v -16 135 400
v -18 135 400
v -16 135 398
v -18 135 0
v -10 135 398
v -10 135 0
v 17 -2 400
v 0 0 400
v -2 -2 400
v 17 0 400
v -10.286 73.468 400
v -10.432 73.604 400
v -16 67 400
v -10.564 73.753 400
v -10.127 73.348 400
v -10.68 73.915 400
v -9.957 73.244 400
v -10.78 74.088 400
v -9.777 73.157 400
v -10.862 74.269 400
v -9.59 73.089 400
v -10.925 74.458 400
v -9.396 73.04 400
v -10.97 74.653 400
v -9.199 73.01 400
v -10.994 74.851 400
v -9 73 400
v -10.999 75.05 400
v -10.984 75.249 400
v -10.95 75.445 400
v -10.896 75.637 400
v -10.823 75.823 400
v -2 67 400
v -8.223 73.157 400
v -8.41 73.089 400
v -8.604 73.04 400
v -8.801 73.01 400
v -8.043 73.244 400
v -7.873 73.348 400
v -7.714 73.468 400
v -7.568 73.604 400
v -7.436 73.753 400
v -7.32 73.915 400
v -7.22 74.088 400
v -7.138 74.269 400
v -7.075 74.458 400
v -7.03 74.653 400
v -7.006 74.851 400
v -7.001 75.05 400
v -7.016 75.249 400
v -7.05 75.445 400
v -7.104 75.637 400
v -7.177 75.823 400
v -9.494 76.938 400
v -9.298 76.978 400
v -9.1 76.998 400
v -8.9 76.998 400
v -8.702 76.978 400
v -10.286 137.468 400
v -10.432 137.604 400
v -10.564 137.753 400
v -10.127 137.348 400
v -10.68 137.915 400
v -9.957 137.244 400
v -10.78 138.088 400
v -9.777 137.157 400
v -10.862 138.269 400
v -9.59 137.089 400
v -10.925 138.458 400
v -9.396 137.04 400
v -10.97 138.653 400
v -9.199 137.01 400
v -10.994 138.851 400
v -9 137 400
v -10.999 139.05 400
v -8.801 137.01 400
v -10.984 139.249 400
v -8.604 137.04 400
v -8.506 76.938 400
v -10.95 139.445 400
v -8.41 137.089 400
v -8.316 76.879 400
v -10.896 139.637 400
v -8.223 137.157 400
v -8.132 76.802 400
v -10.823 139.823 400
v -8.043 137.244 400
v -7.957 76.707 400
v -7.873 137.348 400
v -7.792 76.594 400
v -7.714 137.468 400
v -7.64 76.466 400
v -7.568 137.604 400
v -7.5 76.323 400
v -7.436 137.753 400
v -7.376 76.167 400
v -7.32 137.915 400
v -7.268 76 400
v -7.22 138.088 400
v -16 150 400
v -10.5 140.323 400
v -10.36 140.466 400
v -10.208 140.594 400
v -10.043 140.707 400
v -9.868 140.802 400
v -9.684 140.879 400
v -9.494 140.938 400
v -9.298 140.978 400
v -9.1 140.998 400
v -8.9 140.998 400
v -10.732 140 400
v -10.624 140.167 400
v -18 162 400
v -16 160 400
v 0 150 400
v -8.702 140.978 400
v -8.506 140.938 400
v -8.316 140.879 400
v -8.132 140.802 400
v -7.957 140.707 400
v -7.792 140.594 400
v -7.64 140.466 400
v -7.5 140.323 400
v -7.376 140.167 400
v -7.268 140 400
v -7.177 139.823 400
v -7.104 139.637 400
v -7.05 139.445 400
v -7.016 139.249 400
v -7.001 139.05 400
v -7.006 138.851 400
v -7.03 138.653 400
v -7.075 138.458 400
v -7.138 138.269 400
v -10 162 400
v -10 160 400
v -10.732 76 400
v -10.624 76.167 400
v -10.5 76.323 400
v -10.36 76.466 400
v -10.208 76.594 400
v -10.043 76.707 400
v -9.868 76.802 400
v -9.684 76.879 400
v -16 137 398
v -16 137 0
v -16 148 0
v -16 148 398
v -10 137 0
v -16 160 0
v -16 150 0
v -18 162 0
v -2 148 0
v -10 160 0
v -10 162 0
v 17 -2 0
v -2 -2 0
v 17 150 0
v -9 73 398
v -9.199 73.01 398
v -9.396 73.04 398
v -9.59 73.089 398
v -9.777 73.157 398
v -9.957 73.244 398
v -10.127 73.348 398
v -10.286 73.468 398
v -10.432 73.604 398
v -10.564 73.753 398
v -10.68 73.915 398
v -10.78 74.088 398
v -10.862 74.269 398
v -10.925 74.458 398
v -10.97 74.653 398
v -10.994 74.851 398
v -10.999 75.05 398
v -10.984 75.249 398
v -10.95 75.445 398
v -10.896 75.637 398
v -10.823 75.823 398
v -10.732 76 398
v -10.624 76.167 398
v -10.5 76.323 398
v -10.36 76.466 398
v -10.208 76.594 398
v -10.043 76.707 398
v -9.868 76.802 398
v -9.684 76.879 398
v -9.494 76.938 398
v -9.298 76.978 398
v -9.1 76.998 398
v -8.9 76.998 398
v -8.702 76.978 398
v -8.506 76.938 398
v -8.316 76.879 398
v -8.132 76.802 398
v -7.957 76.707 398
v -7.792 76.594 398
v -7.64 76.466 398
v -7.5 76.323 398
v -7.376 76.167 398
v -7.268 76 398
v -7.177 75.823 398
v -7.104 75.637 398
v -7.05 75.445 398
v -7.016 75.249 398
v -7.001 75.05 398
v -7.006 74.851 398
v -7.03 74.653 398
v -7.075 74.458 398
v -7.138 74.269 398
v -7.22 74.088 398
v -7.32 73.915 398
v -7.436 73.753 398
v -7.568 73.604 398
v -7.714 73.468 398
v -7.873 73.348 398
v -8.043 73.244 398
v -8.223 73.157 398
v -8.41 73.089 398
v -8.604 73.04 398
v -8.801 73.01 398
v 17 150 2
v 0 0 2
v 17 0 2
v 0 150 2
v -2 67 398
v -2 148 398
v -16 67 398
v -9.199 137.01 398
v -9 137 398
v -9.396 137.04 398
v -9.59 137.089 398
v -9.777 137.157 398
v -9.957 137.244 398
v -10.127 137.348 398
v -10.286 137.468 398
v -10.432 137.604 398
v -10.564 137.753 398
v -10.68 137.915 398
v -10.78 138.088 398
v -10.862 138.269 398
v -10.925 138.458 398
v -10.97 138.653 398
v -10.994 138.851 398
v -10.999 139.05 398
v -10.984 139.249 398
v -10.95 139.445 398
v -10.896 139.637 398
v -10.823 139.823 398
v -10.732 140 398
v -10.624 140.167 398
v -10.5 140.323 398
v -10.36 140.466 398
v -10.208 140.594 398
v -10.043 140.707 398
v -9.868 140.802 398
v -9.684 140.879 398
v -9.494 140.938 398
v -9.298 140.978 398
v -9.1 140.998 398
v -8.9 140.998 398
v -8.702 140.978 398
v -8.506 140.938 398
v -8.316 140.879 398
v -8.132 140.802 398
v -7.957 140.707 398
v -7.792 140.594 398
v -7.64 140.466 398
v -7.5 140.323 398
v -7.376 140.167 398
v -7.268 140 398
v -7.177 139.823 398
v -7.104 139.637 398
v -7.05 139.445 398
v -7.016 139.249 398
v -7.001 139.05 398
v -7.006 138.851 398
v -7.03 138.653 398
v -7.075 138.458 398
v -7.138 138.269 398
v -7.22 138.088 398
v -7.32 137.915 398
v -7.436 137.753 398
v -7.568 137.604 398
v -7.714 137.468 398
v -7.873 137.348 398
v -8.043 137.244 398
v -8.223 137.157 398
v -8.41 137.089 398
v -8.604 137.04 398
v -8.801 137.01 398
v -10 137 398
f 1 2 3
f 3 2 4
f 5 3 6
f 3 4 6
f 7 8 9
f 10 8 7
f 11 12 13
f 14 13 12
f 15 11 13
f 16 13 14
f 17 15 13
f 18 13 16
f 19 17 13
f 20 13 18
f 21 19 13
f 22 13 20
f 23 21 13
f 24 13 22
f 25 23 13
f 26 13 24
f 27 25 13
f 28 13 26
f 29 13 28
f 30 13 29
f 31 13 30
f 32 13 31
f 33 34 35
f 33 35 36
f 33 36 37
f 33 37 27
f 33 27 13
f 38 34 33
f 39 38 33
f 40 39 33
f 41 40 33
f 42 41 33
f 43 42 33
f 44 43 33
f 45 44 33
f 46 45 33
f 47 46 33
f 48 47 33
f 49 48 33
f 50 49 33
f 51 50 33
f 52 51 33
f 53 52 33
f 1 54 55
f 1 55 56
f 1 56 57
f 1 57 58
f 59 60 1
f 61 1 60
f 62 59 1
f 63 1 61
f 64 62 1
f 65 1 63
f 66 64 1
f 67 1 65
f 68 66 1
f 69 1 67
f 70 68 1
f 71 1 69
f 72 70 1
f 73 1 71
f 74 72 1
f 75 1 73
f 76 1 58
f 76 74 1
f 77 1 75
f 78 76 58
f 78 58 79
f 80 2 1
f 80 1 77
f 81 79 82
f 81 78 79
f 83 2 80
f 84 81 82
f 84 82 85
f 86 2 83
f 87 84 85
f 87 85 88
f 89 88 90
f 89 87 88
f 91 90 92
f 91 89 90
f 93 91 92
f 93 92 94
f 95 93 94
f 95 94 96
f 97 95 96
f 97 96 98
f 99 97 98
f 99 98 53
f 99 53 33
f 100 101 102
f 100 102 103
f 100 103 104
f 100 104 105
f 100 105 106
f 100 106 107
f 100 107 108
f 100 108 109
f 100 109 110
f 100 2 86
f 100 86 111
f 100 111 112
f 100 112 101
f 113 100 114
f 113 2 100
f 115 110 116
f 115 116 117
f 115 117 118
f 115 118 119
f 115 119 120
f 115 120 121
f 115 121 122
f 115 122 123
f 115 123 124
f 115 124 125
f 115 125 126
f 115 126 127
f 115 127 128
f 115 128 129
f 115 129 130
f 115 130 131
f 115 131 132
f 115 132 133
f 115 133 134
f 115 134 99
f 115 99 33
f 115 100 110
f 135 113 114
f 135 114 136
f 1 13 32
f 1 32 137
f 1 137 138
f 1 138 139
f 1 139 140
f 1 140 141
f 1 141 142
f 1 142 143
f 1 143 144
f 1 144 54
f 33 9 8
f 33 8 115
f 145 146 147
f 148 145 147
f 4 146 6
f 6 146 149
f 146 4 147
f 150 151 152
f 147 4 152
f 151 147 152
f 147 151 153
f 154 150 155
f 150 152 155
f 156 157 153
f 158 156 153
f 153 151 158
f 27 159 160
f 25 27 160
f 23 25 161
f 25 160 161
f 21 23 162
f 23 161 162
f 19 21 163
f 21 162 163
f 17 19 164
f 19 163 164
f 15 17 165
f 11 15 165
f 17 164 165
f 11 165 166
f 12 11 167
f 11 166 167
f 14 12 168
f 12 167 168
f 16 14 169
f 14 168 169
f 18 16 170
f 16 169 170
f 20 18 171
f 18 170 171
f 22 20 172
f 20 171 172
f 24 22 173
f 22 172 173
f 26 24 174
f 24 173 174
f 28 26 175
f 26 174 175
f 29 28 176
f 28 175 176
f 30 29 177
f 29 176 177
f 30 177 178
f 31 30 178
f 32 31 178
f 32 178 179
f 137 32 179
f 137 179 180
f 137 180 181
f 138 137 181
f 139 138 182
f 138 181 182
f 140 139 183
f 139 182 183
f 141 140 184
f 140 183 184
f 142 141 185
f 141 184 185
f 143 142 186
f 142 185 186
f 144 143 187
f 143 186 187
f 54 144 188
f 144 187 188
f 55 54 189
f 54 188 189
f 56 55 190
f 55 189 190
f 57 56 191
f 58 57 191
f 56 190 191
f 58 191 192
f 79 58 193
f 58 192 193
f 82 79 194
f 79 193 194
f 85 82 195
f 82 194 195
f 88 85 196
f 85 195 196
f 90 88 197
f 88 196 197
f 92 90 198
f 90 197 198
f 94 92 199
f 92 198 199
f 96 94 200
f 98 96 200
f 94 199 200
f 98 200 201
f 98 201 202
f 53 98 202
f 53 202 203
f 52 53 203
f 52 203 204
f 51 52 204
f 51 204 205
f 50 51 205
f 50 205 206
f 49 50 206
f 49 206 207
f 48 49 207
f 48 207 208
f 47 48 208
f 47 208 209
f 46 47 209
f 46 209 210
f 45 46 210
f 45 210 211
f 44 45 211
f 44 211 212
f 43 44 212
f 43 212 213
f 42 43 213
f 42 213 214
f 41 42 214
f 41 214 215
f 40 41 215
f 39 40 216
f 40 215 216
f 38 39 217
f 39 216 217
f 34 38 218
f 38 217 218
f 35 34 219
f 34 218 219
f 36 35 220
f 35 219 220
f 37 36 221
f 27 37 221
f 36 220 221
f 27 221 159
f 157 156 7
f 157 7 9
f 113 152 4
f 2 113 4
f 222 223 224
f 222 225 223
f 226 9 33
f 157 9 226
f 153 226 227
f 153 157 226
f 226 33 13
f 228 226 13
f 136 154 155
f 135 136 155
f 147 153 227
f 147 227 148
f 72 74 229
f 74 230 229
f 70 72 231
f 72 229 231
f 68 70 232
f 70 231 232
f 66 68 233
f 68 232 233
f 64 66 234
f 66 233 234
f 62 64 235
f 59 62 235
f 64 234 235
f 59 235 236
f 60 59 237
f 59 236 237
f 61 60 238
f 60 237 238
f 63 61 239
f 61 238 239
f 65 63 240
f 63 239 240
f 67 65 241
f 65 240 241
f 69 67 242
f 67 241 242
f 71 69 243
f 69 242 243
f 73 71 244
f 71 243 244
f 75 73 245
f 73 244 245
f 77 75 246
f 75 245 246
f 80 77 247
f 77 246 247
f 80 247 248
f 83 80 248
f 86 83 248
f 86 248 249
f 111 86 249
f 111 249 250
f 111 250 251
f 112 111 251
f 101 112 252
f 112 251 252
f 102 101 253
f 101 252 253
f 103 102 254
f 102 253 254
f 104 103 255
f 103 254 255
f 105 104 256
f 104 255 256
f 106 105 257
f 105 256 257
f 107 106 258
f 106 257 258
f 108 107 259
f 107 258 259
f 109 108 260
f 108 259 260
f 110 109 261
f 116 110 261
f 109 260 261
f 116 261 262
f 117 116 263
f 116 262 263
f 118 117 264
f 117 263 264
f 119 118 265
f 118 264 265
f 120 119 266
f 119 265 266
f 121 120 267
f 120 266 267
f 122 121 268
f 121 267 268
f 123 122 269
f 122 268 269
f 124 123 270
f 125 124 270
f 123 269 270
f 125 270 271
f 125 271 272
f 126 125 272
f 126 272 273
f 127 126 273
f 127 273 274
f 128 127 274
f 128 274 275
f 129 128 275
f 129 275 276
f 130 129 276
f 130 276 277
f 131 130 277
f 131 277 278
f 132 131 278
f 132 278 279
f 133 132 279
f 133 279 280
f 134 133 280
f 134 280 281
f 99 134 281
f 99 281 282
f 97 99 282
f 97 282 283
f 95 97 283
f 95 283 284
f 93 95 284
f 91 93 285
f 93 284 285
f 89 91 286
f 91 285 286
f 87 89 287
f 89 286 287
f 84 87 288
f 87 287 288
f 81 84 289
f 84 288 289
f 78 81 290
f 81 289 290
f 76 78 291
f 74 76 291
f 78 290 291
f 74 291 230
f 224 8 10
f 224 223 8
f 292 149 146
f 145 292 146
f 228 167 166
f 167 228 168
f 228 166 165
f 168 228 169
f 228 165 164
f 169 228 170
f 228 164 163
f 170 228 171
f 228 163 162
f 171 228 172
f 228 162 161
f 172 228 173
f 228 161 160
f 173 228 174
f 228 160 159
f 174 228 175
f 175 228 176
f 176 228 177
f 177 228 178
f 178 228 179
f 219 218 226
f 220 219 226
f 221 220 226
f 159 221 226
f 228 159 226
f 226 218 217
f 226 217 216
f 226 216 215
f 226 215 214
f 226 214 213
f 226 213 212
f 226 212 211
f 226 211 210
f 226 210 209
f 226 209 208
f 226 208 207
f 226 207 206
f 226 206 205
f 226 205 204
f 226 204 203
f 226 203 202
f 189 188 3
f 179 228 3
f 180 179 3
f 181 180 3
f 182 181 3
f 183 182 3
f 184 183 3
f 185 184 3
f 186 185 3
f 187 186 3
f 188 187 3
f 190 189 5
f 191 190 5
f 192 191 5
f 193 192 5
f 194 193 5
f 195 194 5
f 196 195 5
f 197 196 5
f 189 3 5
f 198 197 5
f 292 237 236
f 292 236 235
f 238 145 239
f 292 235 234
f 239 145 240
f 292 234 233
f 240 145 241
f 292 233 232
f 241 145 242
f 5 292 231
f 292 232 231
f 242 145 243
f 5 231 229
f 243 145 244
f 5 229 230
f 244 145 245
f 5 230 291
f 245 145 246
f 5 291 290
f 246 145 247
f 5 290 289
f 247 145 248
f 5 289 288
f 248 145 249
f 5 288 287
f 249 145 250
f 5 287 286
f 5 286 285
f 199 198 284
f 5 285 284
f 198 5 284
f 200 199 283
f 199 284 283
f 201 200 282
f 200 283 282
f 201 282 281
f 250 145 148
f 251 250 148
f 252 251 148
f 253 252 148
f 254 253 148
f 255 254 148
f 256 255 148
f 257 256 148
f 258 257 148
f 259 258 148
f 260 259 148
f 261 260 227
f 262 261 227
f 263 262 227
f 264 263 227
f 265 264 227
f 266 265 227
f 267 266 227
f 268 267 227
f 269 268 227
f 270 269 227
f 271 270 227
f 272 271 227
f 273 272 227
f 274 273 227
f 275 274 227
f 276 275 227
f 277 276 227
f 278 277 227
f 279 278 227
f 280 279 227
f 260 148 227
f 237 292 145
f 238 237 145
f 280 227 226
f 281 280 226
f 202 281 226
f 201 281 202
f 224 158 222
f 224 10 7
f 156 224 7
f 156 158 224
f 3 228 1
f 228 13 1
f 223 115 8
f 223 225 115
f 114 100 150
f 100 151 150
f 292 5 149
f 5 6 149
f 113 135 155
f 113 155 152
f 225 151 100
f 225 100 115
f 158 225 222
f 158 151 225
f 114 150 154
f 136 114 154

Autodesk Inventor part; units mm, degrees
ref_plane "YZ Plane" through (0, 0, 0) normal (1, 0, 0) x (0, 1, 0)
ref_plane "XZ Plane" through (0, 0, 0) normal (0, 1, 0) x (-1, 0, 0)
ref_plane "XY Plane" through (0, 0, 0) normal (0, 0, 1) x (1, 0, 0)
sketch "Szkic1" plane through (0, 0, 0) normal (0, 0, 1) x (1, 0, 0)
  line L0 (0, 0) -> (17, 0)
  line L1 (17, 0) -> (17, -2)
  line L2 (17, -2) -> (-2, -2)
  line L3 (-2, -2) -> (-2, 148)
  line L4 (-2, 148) -> (-16, 148)
  line L5 (-16, 148) -> (-16, 150)
  line L6 (-16, 150) -> (0, 150)
  line L7 (0, 150) -> (0, 0)
  line L8 (0, 150) -> (17, 150)
  line L9 (17, 150) -> (17, 0)
  line L10 (-16, 150) -> (-16, 160)
  line L11 (-16, 160) -> (-10, 160)
  line L12 (-10, 160) -> (-10, 162)
  line L13 (-10, 162) -> (-18, 162)
  line L14 (-18, 162) -> (-18, 135)
  line L15 (-18, 135) -> (-10, 135)
  line L16 (-10, 135) -> (-10, 137)
  line L17 (-10, 137) -> (-16, 137)
  line L18 (-16, 137) -> (-16, 148)
  dimension "d0" = 17
  dimension "d1" = 2
  dimension "d2" = 2
  dimension "d3" = 148
  dimension "d4" = 2
  dimension "d5" = 14
  dimension "d10" = 2
  dimension "d11" = 6
  dimension "d12" = 2
  dimension "d13" = 2
  dimension "d14" = 27
  dimension "d15" = 11
extrude "Wyciągnięcie proste1" add sketch "Szkic1" along normal blind 400 contours L0 L1 L2 L3 L4 L5 L6 L7 | L5 L18 L17 L16 L15 L14 L13 L12 L11 L10
extrude "Wyciągnięcie proste2" add sketch "Szkic1" along normal blind 2 contours L7 L8 L9 L0
sketch "Szkic2" plane through (0, 0, 400) normal (0, 0, 1) x (1, 0, 0)
  line L0 (-16, 148) -> (-2, 148) projected
  line L1 (-2, 148) -> (-2, -2) projected
  line L2 (17, 0) -> (0, 0) projected
  line L3 (-16, 148) -> (-2, 148)
  line L4 (-2, 148) -> (-2, 67)
  line L5 (-2, 67) -> (-16, 67)
  line L6 (-16, 67) -> (-16, 148)
  line L7 (-9, 67) -> (-9, 148) construction
  point P0 (-9, 75)
  point P1 (-9, 139)
  dimension "d16" = 75
  dimension "d17" = 64
  dimension "d18" = 8
extrude "Wyciągnięcie proste3" add sketch "Szkic2" against normal blind 2
hole "Otwór1" at (-9, 75, 400) at (-9, 139, 400) direction (0, 0, -1) diameter 4 end up to surface
properties part number "bok szuflady metalbox 150x400mm lewy"
